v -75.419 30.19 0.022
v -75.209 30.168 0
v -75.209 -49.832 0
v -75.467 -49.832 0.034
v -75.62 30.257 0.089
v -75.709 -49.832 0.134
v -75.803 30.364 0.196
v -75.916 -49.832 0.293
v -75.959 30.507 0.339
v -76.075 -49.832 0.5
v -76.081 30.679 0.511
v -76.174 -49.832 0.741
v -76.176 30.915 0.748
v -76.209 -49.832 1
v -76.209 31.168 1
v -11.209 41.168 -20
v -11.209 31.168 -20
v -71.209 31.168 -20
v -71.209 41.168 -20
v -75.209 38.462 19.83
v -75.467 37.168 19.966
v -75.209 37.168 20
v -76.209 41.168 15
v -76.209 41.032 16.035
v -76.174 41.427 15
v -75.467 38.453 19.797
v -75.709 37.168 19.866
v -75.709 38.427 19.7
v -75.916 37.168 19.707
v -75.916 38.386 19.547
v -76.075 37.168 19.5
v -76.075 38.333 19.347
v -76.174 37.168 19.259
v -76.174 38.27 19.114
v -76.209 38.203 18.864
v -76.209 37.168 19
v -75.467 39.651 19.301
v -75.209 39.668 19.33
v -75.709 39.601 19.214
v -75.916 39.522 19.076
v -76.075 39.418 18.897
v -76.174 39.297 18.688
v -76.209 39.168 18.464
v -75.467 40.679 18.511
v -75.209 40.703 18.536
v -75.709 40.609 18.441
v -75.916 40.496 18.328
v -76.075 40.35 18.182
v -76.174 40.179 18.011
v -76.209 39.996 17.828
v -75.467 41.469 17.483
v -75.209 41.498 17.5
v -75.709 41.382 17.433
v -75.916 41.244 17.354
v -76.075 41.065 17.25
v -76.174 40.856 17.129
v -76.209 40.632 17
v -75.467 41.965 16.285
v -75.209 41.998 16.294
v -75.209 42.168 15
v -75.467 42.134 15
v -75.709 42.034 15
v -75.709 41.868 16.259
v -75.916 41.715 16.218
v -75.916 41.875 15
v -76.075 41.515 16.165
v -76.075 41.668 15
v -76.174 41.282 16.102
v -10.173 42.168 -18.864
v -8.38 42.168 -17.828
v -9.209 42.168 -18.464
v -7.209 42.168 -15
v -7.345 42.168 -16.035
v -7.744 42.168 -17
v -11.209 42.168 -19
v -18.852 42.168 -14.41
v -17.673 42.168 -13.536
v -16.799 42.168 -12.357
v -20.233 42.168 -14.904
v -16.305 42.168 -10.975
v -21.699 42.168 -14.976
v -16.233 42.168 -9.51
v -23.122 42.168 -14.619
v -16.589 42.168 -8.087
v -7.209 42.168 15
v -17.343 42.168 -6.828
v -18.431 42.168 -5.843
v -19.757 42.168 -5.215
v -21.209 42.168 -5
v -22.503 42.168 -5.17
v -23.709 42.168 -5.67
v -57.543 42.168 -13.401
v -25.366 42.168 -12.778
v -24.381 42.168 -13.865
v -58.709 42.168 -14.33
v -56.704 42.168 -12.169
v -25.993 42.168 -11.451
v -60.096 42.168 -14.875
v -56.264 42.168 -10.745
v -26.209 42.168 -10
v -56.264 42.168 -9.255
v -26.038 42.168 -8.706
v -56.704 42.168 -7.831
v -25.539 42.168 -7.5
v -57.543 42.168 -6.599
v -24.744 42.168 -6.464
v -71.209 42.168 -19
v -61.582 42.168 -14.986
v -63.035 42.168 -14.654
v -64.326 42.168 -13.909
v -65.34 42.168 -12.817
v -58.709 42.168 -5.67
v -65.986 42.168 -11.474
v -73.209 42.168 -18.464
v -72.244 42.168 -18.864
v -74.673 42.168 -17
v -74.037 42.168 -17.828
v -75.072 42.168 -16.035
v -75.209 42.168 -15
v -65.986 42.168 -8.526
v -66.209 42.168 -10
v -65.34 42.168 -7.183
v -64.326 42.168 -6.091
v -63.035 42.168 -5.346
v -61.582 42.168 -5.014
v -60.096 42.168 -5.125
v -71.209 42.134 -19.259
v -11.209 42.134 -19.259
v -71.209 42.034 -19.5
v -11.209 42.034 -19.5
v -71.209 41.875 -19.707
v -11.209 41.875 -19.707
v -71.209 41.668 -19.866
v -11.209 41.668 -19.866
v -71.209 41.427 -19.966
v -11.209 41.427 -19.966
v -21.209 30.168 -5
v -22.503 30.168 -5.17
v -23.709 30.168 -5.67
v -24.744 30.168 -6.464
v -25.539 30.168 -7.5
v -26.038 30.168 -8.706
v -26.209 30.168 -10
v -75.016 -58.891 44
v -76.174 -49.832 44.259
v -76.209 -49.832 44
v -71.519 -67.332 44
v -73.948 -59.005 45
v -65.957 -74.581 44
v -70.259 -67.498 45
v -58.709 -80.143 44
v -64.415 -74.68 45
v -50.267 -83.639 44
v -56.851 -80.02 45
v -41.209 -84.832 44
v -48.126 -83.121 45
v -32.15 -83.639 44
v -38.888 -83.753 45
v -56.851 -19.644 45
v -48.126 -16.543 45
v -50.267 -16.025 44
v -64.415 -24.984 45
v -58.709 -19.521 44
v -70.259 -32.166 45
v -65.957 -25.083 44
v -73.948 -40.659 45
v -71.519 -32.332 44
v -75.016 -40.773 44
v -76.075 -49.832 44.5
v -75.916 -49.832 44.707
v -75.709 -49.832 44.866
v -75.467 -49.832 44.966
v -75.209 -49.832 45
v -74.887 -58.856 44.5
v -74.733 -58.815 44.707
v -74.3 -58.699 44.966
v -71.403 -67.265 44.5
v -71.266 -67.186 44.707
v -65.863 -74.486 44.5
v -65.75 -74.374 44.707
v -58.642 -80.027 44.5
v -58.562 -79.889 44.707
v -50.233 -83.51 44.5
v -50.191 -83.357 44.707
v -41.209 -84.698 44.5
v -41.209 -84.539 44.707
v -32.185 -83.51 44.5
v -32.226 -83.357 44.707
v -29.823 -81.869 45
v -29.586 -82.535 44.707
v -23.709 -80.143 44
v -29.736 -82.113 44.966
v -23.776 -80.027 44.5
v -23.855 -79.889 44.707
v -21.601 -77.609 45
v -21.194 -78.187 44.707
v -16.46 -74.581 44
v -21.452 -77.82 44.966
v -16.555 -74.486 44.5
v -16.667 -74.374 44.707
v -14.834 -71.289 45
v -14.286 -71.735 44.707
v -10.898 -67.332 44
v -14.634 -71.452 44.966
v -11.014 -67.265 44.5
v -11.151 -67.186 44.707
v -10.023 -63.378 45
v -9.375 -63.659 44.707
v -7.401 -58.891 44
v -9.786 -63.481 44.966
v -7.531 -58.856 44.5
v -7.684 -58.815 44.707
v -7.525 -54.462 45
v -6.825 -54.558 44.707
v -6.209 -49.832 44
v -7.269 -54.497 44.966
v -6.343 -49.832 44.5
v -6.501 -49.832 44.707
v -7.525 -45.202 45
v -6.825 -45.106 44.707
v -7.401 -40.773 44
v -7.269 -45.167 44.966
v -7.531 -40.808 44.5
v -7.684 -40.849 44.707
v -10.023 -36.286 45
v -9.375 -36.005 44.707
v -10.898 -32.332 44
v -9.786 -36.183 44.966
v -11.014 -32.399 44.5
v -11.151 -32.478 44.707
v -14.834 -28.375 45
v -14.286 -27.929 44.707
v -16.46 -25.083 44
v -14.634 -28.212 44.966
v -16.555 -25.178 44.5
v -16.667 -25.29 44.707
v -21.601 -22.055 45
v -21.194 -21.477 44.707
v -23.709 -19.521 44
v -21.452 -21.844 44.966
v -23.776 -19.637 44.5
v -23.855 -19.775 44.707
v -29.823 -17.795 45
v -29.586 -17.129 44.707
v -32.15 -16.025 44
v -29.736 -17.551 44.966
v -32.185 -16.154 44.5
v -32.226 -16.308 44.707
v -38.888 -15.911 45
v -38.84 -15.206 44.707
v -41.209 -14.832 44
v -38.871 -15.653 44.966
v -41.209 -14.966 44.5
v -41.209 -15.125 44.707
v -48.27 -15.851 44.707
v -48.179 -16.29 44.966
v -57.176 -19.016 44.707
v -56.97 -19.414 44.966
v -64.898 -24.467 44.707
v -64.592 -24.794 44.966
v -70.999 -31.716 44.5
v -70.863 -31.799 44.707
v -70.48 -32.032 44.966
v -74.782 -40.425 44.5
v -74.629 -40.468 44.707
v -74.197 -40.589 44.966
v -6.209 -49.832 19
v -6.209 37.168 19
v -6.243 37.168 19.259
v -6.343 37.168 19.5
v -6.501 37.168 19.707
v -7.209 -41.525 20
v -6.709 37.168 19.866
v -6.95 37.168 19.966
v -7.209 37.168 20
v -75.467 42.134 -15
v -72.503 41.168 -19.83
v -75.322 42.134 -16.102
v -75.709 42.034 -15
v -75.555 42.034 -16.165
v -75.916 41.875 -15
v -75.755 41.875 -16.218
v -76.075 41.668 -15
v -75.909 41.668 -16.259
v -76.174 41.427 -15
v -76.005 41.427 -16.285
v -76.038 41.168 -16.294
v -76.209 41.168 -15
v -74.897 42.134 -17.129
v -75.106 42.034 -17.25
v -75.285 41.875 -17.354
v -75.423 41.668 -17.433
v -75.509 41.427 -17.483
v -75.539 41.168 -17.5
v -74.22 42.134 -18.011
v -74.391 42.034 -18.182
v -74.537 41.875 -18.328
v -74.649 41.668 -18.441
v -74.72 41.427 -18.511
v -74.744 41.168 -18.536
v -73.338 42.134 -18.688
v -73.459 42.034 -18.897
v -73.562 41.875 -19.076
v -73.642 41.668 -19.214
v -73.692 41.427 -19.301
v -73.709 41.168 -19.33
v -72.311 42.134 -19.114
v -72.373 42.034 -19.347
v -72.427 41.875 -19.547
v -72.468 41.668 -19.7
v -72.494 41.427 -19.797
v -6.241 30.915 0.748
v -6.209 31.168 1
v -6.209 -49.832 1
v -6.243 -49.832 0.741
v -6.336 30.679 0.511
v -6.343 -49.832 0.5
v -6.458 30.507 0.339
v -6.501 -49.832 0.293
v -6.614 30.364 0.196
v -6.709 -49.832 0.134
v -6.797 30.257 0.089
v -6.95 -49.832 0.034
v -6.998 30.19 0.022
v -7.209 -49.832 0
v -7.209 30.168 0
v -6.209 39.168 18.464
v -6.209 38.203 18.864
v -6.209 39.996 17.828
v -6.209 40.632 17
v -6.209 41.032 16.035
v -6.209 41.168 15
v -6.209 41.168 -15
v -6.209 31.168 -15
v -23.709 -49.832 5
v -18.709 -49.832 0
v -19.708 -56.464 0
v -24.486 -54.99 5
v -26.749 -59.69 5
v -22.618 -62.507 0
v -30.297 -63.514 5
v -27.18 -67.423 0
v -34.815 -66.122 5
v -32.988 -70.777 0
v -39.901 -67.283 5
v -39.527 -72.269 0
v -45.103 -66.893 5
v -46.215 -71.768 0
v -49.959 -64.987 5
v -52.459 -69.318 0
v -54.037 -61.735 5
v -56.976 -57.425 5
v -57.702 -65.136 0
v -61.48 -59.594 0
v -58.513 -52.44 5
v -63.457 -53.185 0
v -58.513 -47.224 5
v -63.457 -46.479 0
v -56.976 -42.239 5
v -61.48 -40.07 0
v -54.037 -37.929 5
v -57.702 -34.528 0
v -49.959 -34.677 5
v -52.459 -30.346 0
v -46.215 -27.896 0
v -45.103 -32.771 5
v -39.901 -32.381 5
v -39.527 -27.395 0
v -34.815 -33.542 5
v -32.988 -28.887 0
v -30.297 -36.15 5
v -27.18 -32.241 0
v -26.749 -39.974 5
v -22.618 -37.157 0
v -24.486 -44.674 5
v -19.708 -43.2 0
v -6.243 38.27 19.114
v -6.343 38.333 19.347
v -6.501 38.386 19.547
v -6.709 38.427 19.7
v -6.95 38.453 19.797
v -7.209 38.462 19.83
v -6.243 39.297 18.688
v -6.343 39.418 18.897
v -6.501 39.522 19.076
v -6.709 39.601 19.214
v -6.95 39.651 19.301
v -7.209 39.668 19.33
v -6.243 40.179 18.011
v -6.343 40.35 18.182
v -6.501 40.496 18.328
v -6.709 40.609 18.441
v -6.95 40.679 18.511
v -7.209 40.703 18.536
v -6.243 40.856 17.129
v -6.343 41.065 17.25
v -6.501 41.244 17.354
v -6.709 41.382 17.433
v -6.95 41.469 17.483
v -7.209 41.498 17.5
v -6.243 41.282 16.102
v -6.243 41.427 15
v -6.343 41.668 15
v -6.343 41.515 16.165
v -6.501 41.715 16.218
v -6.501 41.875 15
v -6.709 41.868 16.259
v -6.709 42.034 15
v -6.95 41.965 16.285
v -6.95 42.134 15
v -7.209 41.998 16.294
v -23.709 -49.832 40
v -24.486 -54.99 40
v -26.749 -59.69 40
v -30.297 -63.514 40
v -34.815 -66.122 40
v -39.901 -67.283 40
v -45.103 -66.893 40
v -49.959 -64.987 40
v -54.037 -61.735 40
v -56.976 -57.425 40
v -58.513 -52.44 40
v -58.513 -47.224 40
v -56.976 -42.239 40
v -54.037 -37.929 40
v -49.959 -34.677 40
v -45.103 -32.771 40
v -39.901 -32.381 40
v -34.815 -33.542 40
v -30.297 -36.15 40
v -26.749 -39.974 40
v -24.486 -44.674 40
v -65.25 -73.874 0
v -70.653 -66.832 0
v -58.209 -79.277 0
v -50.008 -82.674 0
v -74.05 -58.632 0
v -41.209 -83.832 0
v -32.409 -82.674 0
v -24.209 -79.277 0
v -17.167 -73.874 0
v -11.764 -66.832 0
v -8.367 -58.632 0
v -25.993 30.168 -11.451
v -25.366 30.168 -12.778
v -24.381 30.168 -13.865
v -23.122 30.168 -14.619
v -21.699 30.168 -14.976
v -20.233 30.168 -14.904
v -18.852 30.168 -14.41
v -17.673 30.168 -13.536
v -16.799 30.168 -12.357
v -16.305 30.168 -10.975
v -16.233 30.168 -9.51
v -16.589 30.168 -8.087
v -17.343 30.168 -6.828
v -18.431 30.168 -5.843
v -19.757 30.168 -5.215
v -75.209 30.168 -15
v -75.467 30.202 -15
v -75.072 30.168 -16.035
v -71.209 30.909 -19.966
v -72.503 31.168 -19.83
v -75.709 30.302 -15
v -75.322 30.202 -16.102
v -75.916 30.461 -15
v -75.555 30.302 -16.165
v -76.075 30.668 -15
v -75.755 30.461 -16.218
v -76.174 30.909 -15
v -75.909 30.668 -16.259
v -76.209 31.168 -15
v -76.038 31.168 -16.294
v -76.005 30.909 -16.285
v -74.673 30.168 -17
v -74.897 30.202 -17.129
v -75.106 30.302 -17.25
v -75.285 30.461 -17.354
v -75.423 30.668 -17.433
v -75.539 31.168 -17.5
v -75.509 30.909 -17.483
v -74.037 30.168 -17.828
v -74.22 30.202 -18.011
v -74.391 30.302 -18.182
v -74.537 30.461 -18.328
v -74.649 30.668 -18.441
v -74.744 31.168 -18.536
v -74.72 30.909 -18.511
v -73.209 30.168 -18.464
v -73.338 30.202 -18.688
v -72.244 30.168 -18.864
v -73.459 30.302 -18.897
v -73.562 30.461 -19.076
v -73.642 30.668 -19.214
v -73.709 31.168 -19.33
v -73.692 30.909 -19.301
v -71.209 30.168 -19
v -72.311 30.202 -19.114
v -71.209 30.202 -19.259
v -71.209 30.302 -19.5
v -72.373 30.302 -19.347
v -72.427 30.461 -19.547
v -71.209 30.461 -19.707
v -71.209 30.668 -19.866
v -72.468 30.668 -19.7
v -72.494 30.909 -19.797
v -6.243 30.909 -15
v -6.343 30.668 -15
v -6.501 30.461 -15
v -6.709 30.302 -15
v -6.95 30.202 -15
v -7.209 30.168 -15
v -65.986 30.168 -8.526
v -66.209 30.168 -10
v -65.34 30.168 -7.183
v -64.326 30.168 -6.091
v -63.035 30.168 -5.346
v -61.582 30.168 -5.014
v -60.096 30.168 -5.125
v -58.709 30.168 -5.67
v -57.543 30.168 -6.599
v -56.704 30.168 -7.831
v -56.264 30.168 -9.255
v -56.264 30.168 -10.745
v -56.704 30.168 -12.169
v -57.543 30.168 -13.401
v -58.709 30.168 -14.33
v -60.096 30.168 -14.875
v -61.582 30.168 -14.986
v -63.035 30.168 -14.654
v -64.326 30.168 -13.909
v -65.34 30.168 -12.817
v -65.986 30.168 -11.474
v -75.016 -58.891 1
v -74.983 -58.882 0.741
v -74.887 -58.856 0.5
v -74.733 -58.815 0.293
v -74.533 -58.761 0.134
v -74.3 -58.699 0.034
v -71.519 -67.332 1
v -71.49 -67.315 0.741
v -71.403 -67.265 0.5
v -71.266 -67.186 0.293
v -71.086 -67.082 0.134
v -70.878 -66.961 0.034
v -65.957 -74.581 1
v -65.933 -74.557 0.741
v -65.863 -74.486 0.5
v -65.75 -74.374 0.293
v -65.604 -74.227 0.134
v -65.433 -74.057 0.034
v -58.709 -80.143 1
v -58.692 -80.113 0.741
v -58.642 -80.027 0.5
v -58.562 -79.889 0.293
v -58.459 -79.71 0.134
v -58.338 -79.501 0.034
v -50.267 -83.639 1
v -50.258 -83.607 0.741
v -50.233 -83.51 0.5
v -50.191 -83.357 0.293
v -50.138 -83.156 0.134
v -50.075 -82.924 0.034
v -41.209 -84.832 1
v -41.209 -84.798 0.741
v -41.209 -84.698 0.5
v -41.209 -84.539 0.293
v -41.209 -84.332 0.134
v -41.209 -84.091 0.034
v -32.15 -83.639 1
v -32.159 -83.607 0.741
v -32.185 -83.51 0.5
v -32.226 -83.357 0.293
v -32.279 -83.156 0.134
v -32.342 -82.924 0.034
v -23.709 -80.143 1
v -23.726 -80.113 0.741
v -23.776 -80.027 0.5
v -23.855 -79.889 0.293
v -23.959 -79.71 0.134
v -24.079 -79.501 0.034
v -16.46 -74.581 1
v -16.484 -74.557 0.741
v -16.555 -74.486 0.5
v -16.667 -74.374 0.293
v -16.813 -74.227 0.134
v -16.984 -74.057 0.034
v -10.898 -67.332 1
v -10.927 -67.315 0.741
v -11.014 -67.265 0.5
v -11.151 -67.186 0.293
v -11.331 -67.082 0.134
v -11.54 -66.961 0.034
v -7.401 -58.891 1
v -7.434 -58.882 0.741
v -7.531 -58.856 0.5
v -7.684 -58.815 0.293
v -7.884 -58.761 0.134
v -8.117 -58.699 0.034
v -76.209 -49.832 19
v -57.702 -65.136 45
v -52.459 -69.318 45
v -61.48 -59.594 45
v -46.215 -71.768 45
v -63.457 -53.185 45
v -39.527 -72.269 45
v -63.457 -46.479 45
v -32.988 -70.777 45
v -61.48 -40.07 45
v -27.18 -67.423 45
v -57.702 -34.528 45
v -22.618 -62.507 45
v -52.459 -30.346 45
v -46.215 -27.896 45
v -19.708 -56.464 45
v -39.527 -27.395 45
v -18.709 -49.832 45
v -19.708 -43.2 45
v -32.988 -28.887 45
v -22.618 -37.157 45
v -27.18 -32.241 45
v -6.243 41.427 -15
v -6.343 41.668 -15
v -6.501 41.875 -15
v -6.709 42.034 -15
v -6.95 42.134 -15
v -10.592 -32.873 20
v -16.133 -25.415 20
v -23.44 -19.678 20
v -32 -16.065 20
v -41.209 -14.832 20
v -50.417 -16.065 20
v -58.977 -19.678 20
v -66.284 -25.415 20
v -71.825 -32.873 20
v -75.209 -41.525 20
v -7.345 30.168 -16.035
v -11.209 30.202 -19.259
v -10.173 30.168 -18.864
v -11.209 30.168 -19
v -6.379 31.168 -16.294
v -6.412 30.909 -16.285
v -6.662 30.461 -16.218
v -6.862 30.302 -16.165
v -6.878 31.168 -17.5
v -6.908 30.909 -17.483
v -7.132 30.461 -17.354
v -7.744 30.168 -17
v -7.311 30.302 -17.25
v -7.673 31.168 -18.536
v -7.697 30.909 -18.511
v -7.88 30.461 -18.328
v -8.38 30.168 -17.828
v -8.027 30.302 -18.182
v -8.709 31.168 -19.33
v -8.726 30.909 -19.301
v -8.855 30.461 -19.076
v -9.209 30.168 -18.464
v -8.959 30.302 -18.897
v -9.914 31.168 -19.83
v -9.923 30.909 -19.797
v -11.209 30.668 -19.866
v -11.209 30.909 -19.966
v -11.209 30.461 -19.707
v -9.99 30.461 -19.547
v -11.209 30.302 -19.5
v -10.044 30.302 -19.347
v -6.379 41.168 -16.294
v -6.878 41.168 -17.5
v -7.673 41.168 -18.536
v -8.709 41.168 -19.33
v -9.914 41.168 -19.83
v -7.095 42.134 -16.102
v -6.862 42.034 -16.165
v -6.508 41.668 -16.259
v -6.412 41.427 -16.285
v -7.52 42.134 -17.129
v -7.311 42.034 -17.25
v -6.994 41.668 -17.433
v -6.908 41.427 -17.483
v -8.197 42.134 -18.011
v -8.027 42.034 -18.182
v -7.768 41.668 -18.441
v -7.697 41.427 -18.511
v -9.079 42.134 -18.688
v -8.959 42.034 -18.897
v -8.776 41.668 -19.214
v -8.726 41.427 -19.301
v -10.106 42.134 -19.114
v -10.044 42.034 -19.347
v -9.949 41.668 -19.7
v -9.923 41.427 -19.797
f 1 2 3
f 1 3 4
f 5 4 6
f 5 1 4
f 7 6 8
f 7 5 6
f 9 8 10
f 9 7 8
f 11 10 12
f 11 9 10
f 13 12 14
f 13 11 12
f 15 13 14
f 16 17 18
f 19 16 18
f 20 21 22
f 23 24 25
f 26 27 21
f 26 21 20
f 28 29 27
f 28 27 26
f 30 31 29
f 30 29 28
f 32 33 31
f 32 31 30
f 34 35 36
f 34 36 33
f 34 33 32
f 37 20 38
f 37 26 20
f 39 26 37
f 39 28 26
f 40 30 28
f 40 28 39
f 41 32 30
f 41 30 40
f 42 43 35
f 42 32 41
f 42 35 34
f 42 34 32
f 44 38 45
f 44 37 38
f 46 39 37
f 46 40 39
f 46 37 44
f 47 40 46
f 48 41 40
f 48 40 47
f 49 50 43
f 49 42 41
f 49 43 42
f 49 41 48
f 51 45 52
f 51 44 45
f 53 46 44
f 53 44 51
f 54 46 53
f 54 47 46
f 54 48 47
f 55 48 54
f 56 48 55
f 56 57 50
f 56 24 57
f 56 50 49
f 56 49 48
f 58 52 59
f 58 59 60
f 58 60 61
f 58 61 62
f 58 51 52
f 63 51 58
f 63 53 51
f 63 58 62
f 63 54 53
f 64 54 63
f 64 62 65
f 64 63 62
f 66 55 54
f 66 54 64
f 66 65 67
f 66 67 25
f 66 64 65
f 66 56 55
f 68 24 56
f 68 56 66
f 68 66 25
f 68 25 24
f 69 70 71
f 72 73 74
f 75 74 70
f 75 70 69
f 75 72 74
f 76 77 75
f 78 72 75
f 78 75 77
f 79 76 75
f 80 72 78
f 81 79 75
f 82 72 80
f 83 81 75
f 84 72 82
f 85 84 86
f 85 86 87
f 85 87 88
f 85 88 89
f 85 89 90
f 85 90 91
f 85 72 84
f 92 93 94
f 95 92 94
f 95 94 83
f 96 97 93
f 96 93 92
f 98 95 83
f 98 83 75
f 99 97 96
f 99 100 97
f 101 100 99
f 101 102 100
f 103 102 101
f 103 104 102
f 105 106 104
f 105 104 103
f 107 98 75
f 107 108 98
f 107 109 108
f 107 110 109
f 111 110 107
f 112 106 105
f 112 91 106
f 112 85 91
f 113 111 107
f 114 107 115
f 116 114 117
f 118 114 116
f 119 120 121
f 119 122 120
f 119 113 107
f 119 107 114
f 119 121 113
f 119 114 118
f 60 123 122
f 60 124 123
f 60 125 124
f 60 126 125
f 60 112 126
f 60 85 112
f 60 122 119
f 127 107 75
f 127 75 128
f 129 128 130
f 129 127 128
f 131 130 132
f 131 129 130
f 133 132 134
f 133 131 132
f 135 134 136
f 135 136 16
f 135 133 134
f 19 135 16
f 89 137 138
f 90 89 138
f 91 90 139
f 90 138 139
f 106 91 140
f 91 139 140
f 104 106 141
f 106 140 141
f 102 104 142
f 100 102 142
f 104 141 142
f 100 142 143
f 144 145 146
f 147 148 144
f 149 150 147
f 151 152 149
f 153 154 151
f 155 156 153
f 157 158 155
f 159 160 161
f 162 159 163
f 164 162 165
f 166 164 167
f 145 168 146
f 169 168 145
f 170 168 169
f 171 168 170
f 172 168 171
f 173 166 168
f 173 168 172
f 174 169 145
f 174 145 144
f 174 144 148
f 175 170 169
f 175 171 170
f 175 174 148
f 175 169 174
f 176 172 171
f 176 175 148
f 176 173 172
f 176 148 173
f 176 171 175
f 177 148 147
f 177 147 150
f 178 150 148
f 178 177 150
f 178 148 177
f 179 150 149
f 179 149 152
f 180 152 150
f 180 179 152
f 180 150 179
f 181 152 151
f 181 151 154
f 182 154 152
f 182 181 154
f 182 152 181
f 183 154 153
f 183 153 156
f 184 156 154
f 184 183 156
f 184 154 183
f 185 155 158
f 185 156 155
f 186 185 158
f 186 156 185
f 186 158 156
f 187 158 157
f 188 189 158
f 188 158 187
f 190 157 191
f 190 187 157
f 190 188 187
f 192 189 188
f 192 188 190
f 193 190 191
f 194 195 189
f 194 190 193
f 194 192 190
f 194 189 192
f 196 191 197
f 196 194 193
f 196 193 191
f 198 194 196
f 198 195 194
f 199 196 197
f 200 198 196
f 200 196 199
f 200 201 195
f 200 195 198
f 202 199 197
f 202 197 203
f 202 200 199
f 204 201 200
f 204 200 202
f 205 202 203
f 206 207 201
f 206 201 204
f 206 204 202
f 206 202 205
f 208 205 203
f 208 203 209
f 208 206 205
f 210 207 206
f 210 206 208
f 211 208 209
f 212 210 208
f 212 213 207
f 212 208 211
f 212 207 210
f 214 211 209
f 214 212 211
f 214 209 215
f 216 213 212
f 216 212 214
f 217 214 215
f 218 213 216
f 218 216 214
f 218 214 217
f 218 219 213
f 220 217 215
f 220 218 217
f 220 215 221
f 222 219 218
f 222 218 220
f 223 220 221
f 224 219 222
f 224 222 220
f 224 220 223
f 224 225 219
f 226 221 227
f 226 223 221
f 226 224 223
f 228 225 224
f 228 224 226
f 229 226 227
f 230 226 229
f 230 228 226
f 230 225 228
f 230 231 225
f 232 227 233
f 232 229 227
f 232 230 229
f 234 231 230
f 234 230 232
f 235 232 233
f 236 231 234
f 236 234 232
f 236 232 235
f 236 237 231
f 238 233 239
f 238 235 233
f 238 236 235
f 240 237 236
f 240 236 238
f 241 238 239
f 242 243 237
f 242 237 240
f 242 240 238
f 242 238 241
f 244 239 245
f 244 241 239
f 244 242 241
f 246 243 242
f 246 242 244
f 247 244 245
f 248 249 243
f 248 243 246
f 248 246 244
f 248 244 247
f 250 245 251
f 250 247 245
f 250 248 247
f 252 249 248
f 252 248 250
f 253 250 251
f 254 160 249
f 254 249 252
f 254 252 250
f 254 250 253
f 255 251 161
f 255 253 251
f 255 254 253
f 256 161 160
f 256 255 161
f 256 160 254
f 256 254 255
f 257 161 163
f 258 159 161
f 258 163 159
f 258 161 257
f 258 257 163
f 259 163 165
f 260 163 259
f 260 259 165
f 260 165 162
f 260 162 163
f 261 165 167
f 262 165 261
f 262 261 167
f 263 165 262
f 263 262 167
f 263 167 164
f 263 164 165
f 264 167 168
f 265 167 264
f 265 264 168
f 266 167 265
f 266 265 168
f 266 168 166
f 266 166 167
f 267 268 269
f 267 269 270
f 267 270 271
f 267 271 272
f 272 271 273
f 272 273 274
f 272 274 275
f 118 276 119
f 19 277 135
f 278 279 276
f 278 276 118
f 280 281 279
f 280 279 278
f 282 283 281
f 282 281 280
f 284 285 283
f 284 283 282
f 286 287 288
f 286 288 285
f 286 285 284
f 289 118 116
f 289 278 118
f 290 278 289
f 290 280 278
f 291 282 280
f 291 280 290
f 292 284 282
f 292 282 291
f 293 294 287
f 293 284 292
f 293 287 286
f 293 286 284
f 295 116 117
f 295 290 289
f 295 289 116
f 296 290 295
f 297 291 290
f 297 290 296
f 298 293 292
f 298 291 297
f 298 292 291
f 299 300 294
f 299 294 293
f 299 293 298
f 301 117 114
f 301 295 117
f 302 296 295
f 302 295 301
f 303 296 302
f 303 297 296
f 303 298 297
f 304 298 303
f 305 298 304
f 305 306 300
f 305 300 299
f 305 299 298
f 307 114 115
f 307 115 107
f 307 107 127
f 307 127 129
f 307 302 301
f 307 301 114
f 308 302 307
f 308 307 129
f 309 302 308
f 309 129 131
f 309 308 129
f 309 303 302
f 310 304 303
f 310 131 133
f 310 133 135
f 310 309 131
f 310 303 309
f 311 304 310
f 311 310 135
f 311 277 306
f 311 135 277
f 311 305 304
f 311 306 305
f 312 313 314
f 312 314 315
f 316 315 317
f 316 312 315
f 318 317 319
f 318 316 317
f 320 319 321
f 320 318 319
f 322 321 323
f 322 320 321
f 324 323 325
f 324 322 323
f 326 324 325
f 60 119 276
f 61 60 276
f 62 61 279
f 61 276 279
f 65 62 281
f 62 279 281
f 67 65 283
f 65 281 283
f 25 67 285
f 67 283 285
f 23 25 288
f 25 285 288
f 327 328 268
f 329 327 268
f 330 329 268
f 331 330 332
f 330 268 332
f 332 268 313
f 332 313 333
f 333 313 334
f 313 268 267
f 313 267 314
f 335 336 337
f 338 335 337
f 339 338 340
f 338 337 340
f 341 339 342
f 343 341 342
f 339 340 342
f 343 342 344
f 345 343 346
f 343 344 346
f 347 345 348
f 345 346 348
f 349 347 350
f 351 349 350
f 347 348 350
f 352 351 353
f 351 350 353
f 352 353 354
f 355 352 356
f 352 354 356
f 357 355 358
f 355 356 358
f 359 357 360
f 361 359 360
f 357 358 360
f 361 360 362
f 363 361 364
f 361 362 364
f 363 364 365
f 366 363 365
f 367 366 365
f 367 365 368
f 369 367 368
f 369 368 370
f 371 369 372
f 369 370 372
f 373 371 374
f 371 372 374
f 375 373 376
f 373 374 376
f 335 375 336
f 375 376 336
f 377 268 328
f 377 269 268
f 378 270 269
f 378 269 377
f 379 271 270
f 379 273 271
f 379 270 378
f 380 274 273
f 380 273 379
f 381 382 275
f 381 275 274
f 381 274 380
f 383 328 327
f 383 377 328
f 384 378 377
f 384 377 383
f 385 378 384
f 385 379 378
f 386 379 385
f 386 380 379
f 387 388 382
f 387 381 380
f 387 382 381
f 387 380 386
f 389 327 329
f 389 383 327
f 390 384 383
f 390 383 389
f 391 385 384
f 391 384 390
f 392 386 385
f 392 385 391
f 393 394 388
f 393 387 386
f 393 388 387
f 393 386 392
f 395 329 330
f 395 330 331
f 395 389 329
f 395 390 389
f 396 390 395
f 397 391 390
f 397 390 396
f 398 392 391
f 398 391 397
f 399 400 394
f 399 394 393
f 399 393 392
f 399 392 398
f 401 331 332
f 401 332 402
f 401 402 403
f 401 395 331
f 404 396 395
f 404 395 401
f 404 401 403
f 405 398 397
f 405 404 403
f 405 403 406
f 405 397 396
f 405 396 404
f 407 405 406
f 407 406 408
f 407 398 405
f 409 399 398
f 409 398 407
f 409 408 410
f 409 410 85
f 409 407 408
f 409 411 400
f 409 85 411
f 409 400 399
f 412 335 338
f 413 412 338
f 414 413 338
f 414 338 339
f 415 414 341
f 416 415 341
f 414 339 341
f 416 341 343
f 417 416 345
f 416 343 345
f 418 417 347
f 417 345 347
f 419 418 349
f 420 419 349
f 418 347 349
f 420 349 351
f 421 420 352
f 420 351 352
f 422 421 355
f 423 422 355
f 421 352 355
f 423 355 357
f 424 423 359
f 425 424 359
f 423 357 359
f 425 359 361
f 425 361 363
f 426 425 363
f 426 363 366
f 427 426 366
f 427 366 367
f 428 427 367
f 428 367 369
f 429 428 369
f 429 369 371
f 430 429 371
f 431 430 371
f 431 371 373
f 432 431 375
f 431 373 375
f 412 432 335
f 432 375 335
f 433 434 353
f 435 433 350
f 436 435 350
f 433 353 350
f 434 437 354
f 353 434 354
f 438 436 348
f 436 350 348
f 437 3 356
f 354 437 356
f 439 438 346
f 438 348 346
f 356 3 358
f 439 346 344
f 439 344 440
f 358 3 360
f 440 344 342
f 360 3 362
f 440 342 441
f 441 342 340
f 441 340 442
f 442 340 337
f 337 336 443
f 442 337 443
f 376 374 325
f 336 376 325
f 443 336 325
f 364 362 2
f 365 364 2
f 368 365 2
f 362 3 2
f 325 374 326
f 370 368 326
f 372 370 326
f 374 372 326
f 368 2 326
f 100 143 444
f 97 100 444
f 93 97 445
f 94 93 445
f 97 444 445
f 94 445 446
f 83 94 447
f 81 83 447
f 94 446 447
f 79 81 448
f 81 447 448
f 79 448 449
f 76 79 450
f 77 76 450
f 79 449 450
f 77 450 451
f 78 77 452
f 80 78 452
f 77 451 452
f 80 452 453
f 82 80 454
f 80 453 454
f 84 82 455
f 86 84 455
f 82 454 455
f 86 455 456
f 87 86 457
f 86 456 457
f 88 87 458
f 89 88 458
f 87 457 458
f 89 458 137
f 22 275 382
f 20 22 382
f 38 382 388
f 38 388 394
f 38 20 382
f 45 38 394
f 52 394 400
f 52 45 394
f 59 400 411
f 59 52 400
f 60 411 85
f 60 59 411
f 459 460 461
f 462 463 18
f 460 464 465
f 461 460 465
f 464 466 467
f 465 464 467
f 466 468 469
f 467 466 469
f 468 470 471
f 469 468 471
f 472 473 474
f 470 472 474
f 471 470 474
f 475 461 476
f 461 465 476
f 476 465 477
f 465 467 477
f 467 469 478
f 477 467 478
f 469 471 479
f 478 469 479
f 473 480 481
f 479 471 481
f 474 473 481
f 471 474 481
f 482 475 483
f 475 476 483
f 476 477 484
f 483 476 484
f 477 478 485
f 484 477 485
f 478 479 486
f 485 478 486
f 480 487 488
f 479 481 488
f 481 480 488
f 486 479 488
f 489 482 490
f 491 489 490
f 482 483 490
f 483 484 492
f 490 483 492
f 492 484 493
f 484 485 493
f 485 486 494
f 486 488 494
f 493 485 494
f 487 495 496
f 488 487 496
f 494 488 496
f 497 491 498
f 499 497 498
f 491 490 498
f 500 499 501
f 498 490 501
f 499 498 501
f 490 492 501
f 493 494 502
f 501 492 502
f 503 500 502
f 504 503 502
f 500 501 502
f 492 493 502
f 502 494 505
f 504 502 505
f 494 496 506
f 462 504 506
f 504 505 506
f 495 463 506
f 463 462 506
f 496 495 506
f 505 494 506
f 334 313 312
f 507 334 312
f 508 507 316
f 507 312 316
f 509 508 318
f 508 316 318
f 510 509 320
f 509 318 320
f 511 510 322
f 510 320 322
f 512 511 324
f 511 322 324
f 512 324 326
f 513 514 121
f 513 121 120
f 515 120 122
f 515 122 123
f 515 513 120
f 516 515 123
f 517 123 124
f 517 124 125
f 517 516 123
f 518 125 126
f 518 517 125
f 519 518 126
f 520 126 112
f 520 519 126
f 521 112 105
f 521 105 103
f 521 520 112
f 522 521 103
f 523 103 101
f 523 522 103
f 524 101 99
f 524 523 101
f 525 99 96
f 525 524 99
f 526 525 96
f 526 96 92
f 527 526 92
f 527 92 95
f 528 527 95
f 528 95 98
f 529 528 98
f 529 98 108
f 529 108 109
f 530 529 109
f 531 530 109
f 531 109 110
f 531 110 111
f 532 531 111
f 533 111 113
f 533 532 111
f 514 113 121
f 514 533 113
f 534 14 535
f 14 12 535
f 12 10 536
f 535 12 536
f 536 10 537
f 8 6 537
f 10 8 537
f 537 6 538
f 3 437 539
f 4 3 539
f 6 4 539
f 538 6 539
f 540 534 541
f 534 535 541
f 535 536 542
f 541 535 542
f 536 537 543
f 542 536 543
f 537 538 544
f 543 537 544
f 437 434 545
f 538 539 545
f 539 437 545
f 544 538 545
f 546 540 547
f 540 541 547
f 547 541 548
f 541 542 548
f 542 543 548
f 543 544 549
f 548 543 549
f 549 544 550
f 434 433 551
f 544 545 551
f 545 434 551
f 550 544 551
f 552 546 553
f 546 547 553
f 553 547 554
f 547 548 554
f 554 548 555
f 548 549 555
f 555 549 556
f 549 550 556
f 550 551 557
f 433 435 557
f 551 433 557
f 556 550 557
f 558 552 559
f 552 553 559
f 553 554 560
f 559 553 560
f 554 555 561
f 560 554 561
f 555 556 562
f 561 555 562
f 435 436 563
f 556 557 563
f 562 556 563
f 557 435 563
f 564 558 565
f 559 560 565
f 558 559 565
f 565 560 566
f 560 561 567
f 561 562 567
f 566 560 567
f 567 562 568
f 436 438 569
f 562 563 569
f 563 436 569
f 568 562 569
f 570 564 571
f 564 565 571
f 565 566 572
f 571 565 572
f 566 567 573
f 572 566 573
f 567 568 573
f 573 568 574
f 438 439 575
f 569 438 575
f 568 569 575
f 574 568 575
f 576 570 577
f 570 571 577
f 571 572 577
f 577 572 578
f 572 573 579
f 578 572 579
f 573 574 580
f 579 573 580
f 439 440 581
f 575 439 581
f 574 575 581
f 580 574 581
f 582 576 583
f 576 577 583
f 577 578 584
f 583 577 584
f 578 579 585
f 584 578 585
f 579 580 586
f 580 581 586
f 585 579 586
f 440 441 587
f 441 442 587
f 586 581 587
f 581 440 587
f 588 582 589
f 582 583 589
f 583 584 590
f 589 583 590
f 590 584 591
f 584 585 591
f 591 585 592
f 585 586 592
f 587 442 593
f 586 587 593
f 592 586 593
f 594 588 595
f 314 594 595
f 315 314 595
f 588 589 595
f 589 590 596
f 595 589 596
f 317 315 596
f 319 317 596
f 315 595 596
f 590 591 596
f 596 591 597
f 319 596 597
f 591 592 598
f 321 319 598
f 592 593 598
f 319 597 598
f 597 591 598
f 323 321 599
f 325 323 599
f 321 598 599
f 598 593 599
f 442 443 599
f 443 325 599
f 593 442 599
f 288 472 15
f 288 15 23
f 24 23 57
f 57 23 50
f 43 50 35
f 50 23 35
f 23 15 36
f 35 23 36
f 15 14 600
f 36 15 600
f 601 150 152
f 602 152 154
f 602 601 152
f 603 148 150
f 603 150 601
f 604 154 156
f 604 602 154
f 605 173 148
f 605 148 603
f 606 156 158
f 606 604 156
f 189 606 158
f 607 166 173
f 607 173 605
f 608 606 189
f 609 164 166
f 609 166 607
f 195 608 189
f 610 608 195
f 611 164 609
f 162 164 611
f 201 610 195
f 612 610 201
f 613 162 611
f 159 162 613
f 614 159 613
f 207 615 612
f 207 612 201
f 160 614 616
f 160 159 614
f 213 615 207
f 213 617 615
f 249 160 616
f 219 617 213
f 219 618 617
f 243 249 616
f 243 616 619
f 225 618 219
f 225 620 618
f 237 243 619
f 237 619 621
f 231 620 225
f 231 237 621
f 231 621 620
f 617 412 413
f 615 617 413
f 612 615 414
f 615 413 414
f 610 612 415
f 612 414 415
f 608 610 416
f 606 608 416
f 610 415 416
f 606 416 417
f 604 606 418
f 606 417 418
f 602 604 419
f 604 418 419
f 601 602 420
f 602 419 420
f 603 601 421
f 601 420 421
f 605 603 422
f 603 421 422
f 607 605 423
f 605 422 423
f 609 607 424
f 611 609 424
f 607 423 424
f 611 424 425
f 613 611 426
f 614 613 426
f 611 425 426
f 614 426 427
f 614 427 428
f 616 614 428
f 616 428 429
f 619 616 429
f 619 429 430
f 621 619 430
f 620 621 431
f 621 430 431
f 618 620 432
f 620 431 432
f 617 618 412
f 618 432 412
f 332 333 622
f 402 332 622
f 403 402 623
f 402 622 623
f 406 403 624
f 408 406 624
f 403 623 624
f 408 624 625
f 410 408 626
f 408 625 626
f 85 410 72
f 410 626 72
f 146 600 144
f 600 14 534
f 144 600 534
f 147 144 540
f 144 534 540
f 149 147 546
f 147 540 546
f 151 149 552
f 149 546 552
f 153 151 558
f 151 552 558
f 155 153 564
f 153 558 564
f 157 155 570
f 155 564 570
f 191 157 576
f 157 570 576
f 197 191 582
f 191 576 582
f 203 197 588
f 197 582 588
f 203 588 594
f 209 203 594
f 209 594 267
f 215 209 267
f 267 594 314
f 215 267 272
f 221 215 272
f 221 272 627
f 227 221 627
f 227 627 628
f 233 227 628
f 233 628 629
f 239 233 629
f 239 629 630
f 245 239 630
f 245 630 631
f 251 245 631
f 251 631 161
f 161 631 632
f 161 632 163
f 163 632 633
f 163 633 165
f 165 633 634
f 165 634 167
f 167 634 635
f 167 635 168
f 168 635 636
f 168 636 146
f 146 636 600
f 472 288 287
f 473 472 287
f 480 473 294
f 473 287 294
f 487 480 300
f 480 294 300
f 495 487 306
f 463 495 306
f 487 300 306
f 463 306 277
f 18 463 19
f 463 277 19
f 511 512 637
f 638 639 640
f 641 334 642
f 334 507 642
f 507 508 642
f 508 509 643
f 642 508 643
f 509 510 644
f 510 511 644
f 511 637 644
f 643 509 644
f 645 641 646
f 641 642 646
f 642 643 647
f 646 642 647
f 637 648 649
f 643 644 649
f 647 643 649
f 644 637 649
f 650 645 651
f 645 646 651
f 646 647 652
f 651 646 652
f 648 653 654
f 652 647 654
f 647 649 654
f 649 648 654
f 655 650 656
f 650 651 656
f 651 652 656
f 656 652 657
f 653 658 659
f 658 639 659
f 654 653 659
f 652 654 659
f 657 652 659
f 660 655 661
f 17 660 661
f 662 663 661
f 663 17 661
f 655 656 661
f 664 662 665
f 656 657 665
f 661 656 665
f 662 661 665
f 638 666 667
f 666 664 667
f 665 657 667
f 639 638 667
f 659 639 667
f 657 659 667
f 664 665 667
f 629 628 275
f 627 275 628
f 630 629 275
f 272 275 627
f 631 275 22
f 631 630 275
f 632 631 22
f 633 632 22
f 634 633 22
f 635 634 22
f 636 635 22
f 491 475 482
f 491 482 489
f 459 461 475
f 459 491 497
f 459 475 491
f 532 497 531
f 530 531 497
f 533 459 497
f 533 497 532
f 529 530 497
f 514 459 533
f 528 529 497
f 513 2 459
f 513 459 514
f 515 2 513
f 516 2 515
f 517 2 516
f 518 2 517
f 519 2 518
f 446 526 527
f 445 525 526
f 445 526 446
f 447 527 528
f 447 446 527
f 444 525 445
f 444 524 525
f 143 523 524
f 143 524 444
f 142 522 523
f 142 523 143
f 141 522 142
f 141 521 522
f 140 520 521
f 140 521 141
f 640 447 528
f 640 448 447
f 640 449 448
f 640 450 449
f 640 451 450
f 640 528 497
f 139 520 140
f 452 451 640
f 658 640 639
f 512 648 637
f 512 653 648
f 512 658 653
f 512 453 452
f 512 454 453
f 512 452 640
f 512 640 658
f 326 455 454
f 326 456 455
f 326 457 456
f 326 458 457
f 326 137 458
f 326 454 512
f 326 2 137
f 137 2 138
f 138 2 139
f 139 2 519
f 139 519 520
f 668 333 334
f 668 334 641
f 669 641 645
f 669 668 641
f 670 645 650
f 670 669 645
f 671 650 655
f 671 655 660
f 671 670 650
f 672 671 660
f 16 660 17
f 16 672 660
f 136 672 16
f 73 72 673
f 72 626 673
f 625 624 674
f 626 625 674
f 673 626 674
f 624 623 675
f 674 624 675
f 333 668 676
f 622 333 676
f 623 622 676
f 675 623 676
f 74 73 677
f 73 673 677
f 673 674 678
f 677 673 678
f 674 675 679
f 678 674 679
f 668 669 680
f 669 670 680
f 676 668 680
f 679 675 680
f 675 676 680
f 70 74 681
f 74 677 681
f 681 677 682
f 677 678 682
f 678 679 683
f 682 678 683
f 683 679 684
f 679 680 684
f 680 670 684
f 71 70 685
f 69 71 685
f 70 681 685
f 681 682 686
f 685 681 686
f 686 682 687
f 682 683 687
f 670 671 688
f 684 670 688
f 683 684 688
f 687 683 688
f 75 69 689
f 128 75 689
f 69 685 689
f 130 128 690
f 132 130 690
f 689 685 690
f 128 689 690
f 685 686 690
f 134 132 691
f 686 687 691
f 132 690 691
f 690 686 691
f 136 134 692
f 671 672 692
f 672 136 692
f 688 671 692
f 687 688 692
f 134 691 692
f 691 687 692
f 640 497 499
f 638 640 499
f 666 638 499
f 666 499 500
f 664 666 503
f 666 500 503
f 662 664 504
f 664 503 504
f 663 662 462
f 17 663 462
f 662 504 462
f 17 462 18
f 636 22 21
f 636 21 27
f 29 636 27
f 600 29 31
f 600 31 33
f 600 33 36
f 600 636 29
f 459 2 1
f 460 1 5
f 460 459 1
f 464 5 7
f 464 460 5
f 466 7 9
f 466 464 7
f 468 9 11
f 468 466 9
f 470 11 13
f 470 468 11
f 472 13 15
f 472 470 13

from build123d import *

# Parameters (mm, degrees)
F1_DEPTH     = 45
F2_DEPTH     = 20
F3_W         = 70
F3_H         = 20
F3_R         = 5
F4_DEPTH     = 12
F5_SIZE      = 5
F6_SIZE      = 5
F7_R         = 5
F8_T1_DEPTH  = 80
F8_T3_DEPTH  = 60
F8_T5_DEPTH  = 30
F8_T7_DEPTH  = 15
F8_T12_DEPTH = 99.5
F8_S13_R     = 35
F8_T14_DEPTH = 51
F8_T16_ANGLE = 180
F8_T20_DEPTH = 99.5
F8_S21_R     = 35
F8_T22_DEPTH = 51
F8_T24_ANGLE = 90
F8_T26_ANGLE = 90
F8_T28_ANGLE = 90
F8_T30_ANGLE = 90
F8_T32_ANGLE = 90
F8_T34_ANGLE = 90
F8_T39_DEPTH = 82.5
F8_T43_DEPTH = 17.5
F8_T50_DEPTH = 82.5
F8_T54_DEPTH = 17.5
F9_R         = 1


# Not quite as in the source:
# - a fillet or chamfer that OpenCascade refuses, or shapes differently, is made with other operations: its cross-section is extruded or revolved along the edge and cut away or added


with BuildPart() as f1:
    # F0 (on Top) → F1 (new body)
    with BuildSketch(Plane.XY):
        with BuildLine():
            Line((-23.7085466087, -49.8320348561), (-6.2085466087, -49.8320348561))
            ThreePointArc((-6.2085466087, -49.8320348561), (-41.2085466087, -14.8320348561), (-76.2085466087, -49.8320348561))
            Line((-76.2085466087, -49.8320348561), (-58.7085466087, -49.8320348561))
            ThreePointArc((-58.7085466087, -49.8320348561), (-41.2085466087, -32.3320348561), (-23.7085466087, -49.8320348561))
        make_face()
        with BuildLine():
            ThreePointArc((-76.2085466087, -49.8320348561), (-41.2085466087, -84.8320348561), (-6.2085466087, -49.8320348561))
            Line((-6.2085466087, -49.8320348561), (-23.7085466087, -49.8320348561))
            ThreePointArc((-23.7085466087, -49.8320348561), (-41.2085466087, -67.3320348561), (-58.7085466087, -49.8320348561))
            Line((-58.7085466087, -49.8320348561), (-76.2085466087, -49.8320348561))
        make_face()
    extrude(amount=F1_DEPTH)

    # F0 (on Top) → F2 (join)
    with BuildSketch(Plane.XY):
        with BuildLine():
            Line((-23.7085466087, -49.8320348561), (-6.2085466087, -49.8320348561))
            ThreePointArc((-6.2085466087, -49.8320348561), (-41.2085466087, -14.8320348561), (-76.2085466087, -49.8320348561))
            Line((-76.2085466087, -49.8320348561), (-58.7085466087, -49.8320348561))
            ThreePointArc((-58.7085466087, -49.8320348561), (-41.2085466087, -32.3320348561), (-23.7085466087, -49.8320348561))
        make_face()
        with BuildLine():
            ThreePointArc((-76.2085466087, -49.8320348561), (-41.2085466087, -84.8320348561), (-6.2085466087, -49.8320348561))
            Line((-6.2085466087, -49.8320348561), (-23.7085466087, -49.8320348561))
            ThreePointArc((-23.7085466087, -49.8320348561), (-41.2085466087, -67.3320348561), (-58.7085466087, -49.8320348561))
            Line((-58.7085466087, -49.8320348561), (-76.2085466087, -49.8320348561))
        make_face()
        with BuildLine():
            ThreePointArc((-76.2085466087, -49.8320348561), (-41.2085466087, -14.8320348561), (-6.2085466087, -49.8320348561))
            Line((-6.2085466087, -49.8320348561), (-6.2085466087, 30.1679651439))
            Line((-6.2085466087, 30.1679651439), (-76.2085466087, 30.1679651439))
            Line((-76.2085466087, 30.1679651439), (-76.2085466087, -49.8320348561))
        make_face()
    extrude(amount=F2_DEPTH)

    # F3 (on face) → F4 (join)
    with BuildSketch(Plane(origin=(0, 30.1679651439, 0), x_dir=(-1, 0, 0), z_dir=(0, 1, 0))):
        with Locations((41.2085466087, -10)):
            Rectangle(F3_W, F3_H)
        with BuildLine():
            ThreePointArc((21.2085466087, -5), (24.7440805146, -6.4644660941), (26.2085466087, -10))
            ThreePointArc((26.2085466087, -10), (17.6730127028, -13.5355339059), (21.2085466087, -5))
        make_face(mode=Mode.SUBTRACT)
        with Locations((61.2085466087, -10)):
            Circle(F3_R, mode=Mode.SUBTRACT)
        with Locations((41.2085466087, 10)):
            Rectangle(F3_W, F3_H)
    extrude(amount=F4_DEPTH)

    # F5
    f5_edges = [f1.edges().sort_by_distance(p)[0] for p in [
        (-58.708547, -49.832035, 45),
    ]]
    chamfer(f5_edges, length=F5_SIZE)

    # F6
    f6_edges = [f1.edges().sort_by_distance(p)[0] for p in [
        (-58.708547, -49.832035, 0),
    ]]
    chamfer(f6_edges, length=F6_SIZE)

    # F7
    f7_edges = [f1.edges().sort_by_distance(p)[0] for p in [
        (-76.208547, 36.167965, -20),
        (-6.208547, 36.167965, -20),
        (-41.208547, 42.167965, 20),
    ]]
    fillet(f7_edges, radius=F7_R)

    # F8: fillet of radius 1 on 9 edges, made by hand

    # F8_s2 → F8_t1 (cut)
    with BuildSketch(Plane.XZ.offset(-30.1679651439)):
        with BuildLine():
            ThreePointArc((-75.2085466087, 0), (-75.9156533899, 0.2928932188), (-76.2085466087, 1))
            Line((-76.2085466087, 1), (-76.2085466087, 0))
            Line((-76.2085466087, 0), (-75.2085466087, 0))
        make_face()
        with BuildLine():
            ThreePointArc((-6.2085466087, 1), (-6.5014398275, 0.2928932188), (-7.2085466087, 0))
            Line((-7.2085466087, 0), (-6.2085466087, 0))
            Line((-6.2085466087, 0), (-6.2085466087, 1))
        make_face()
    extrude(amount=F8_T1_DEPTH, mode=Mode.SUBTRACT)

    # F8_s4 → F8_t3 (cut)
    with BuildSketch(Plane.YZ.offset(-71.2085466087)):
        with BuildLine():
            ThreePointArc((30.1679651439, -19), (30.4608583627, -19.7071067812), (31.1679651439, -20))
            Line((31.1679651439, -20), (30.1679651439, -20))
            Line((30.1679651439, -20), (30.1679651439, -19))
        make_face()
        with BuildLine():
            ThreePointArc((42.1679651439, -19), (41.8750719251, -19.7071067812), (41.1679651439, -20))
            Line((41.1679651439, -20), (42.1679651439, -20))
            Line((42.1679651439, -20), (42.1679651439, -19))
        make_face()
    extrude(amount=F8_T3_DEPTH, mode=Mode.SUBTRACT)

    # F8_s6 → F8_t5 (cut)
    with BuildSketch(Plane.XY.offset(-15)):
        with BuildLine():
            ThreePointArc((-6.2085466087, 41.1679651439), (-6.5014398275, 41.8750719251), (-7.2085466087, 42.1679651439))
            Line((-7.2085466087, 42.1679651439), (-6.2085466087, 42.1679651439))
            Line((-6.2085466087, 42.1679651439), (-6.2085466087, 41.1679651439))
        make_face()
        with BuildLine():
            ThreePointArc((-75.2085466087, 42.1679651439), (-75.9156533899, 41.8750719251), (-76.2085466087, 41.1679651439))
            Line((-76.2085466087, 41.1679651439), (-76.2085466087, 42.1679651439))
            Line((-76.2085466087, 42.1679651439), (-75.2085466087, 42.1679651439))
        make_face()
    extrude(amount=F8_T5_DEPTH, mode=Mode.SUBTRACT)

    # F8_s8 → F8_t7 (cut)
    with BuildSketch(Plane.XY.offset(-15)):
        with BuildLine():
            ThreePointArc((-75.2085466087, 30.1679651439), (-75.9156533899, 30.4608583627), (-76.2085466087, 31.1679651439))
            Line((-76.2085466087, 31.1679651439), (-76.2085466087, 30.1679651439))
            Line((-76.2085466087, 30.1679651439), (-75.2085466087, 30.1679651439))
        make_face()
        with BuildLine():
            ThreePointArc((-6.2085466087, 31.1679651439), (-6.5014398275, 30.4608583627), (-7.2085466087, 30.1679651439))
            Line((-7.2085466087, 30.1679651439), (-6.2085466087, 30.1679651439))
            Line((-6.2085466087, 30.1679651439), (-6.2085466087, 31.1679651439))
        make_face()
    extrude(amount=F8_T7_DEPTH, mode=Mode.SUBTRACT)


with BuildPart() as f8_tool10:
    # F8_s11 → F8_t12 (new body)
    with BuildSketch(Plane.XZ.offset(62.3320348561)):
        with BuildLine():
            ThreePointArc((-75.2085466087, 20), (-75.9156533899, 19.7071067812), (-76.2085466087, 19))
            Line((-76.2085466087, 19), (-76.2085466087, 20))
            Line((-76.2085466087, 20), (-75.2085466087, 20))
        make_face()
    extrude(amount=-F8_T12_DEPTH)

    # F8_s13 → F8_t14 (cut, symmetric)
    with BuildSketch(Plane.XY.offset(19.5)):
        with Locations((-41.2085466087, -49.8320348561)):
            Circle(F8_S13_R)
    extrude(amount=F8_T14_DEPTH, both=True, mode=Mode.SUBTRACT)


with BuildPart() as f1_1:
    add(f1.part)

    # F8_t9: cut F8_tool10
    add(f8_tool10.part, mode=Mode.SUBTRACT)

    # F8_s15 → F8_t16 (revolve, cut)
    with BuildSketch(Plane.XZ.offset(49.8320348561)):
        with BuildLine():
            ThreePointArc((-76.2085466087, 1), (-75.9156533899, 0.2928932188), (-75.2085466087, 0))
            Line((-75.2085466087, 0), (-76.2085466087, 0))
            Line((-76.2085466087, 0), (-76.2085466087, 1))
        make_face()
    revolve(axis=Axis((-41.2085466087, -49.8320348561, 0), (0, 0, 1)), revolution_arc=F8_T16_ANGLE, mode=Mode.SUBTRACT)


with BuildPart() as f8_tool18:
    # F8_s19 → F8_t20 (new body)
    with BuildSketch(Plane.XZ.offset(-37.1679651439)):
        with BuildLine():
            ThreePointArc((-6.2085466087, 19), (-6.5014398275, 19.7071067812), (-7.2085466087, 20))
            Line((-7.2085466087, 20), (-6.2085466087, 20))
            Line((-6.2085466087, 20), (-6.2085466087, 19))
        make_face()
    extrude(amount=F8_T20_DEPTH)

    # F8_s21 → F8_t22 (cut, symmetric)
    with BuildSketch(Plane.XY.offset(19.5)):
        with Locations((-41.2085466087, -49.8320348561)):
            Circle(F8_S21_R)
    extrude(amount=F8_T22_DEPTH, both=True, mode=Mode.SUBTRACT)


with BuildPart() as f1_2:
    add(f1_1.part)

    # F8_t17: cut F8_tool18
    add(f8_tool18.part, mode=Mode.SUBTRACT)

    # F8_s23 → F8_t24 (revolve, cut)
    with BuildSketch(Plane.XY.offset(-15)):
        with BuildLine():
            ThreePointArc((-75.2085466087, 42.1679651439), (-75.9156533899, 41.8750719251), (-76.2085466087, 41.1679651439))
            Line((-76.2085466087, 41.1679651439), (-76.2085466087, 42.1679651439))
            Line((-76.2085466087, 42.1679651439), (-75.2085466087, 42.1679651439))
        make_face()
    revolve(axis=Axis((-71.2085466087, 42.1679651439, -15), (0, -1, 0)), revolution_arc=F8_T24_ANGLE, mode=Mode.SUBTRACT)

    # F8_s25 → F8_t26 (revolve, cut)
    with BuildSketch(Plane.XZ.offset(-37.1679651439)):
        with BuildLine():
            ThreePointArc((-75.2085466087, 20), (-75.9156533899, 19.7071067812), (-76.2085466087, 19))
            Line((-76.2085466087, 19), (-76.2085466087, 20))
            Line((-76.2085466087, 20), (-75.2085466087, 20))
        make_face()
    revolve(axis=Axis((-76.2085466087, 37.1679651439, 15), (-1, 0, 0)), revolution_arc=F8_T26_ANGLE, mode=Mode.SUBTRACT)

    # F8_s27 → F8_t28 (revolve, cut)
    with BuildSketch(Plane.XZ.offset(-37.1679651439)):
        with BuildLine():
            ThreePointArc((-6.2085466087, 19), (-6.5014398275, 19.7071067812), (-7.2085466087, 20))
            Line((-7.2085466087, 20), (-6.2085466087, 20))
            Line((-6.2085466087, 20), (-6.2085466087, 19))
        make_face()
    revolve(axis=Axis((-6.2085466087, 37.1679651439, 15), (-1, 0, 0)), revolution_arc=F8_T28_ANGLE, mode=Mode.SUBTRACT)

    # F8_s29 → F8_t30 (revolve, cut)
    with BuildSketch(Plane.XY.offset(-15)):
        with BuildLine():
            ThreePointArc((-7.2085466087, 42.1679651439), (-6.5014398275, 41.8750719251), (-6.2085466087, 41.1679651439))
            Line((-6.2085466087, 41.1679651439), (-6.2085466087, 42.1679651439))
            Line((-6.2085466087, 42.1679651439), (-7.2085466087, 42.1679651439))
        make_face()
    revolve(axis=Axis((-11.2085466087, 42.1679651439, -15), (0, 1, 0)), revolution_arc=F8_T30_ANGLE, mode=Mode.SUBTRACT)

    # F8_s31 → F8_t32 (revolve, cut)
    with BuildSketch(Plane.XY.offset(-15)):
        with BuildLine():
            ThreePointArc((-6.2085466087, 31.1679651439), (-6.5014398275, 30.4608583627), (-7.2085466087, 30.1679651439))
            Line((-7.2085466087, 30.1679651439), (-6.2085466087, 30.1679651439))
            Line((-6.2085466087, 30.1679651439), (-6.2085466087, 31.1679651439))
        make_face()
    revolve(axis=Axis((-11.2085466087, 30.1679651439, -15), (0, 1, 0)), revolution_arc=F8_T32_ANGLE, mode=Mode.SUBTRACT)

    # F8_s33 → F8_t34 (revolve, cut)
    with BuildSketch(Plane.XY.offset(-15)):
        with BuildLine():
            ThreePointArc((-75.2085466087, 30.1679651439), (-75.9156533899, 30.4608583627), (-76.2085466087, 31.1679651439))
            Line((-76.2085466087, 31.1679651439), (-76.2085466087, 30.1679651439))
            Line((-76.2085466087, 30.1679651439), (-75.2085466087, 30.1679651439))
        make_face()
    revolve(axis=Axis((-71.2085466087, 30.1679651439, -15), (0, -1, 0)), revolution_arc=F8_T34_ANGLE, mode=Mode.SUBTRACT)


with BuildPart() as f8_tool37:
    # F8_s38 → F8_t39 (new body)
    with BuildSketch(Plane.XZ.offset(-32.6679651439)):
        with BuildLine():
            ThreePointArc((-75.2085466087, 0), (-75.9156533899, 0.2928932188), (-76.2085466087, 1))
            Line((-76.2085466087, 1), (-76.2085466087, 0))
            Line((-76.2085466087, 0), (-75.2085466087, 0))
        make_face()
    extrude(amount=F8_T39_DEPTH)

    split(bisect_by=Plane.XZ.offset(-30.1679651439), keep=Keep.BOTTOM)


with BuildPart() as f8_tool41:
    # F8_s42 → F8_t43 (new body)
    with BuildSketch(Plane.XY.offset(-15)):
        with BuildLine():
            ThreePointArc((-75.2085466087, 30.1679651439), (-75.9156533899, 30.4608583627), (-76.2085466087, 31.1679651439))
            Line((-76.2085466087, 31.1679651439), (-76.2085466087, 30.1679651439))
            Line((-76.2085466087, 30.1679651439), (-75.2085466087, 30.1679651439))
        make_face()
    extrude(amount=F8_T43_DEPTH)

    split(bisect_by=Plane.XY, keep=Keep.TOP)


with BuildPart() as f8_tool37_1:
    add(f8_tool37.part)

    # F8_t45: intersect F8_tool41
    add(f8_tool41.part, mode=Mode.INTERSECT)


with BuildPart() as f1_3:
    add(f1_2.part)

    # F8_t35: cut F8_tool37
    add(f8_tool37_1.part, mode=Mode.SUBTRACT)


with BuildPart() as f8_tool48:
    # F8_s49 → F8_t50 (new body)
    with BuildSketch(Plane.XZ.offset(49.8320348561)):
        with BuildLine():
            ThreePointArc((-6.2085466087, 1), (-6.5014398275, 0.2928932188), (-7.2085466087, 0))
            Line((-7.2085466087, 0), (-6.2085466087, 0))
            Line((-6.2085466087, 0), (-6.2085466087, 1))
        make_face()
    extrude(amount=-F8_T50_DEPTH)

    split(bisect_by=Plane.XZ.offset(-30.1679651439), keep=Keep.BOTTOM)


with BuildPart() as f8_tool52:
    # F8_s53 → F8_t54 (new body)
    with BuildSketch(Plane.XY.offset(2.5)):
        with BuildLine():
            ThreePointArc((-6.2085466087, 31.1679651439), (-6.5014398275, 30.4608583627), (-7.2085466087, 30.1679651439))
            Line((-7.2085466087, 30.1679651439), (-6.2085466087, 30.1679651439))
            Line((-6.2085466087, 30.1679651439), (-6.2085466087, 31.1679651439))
        make_face()
    extrude(amount=-F8_T54_DEPTH)

    split(bisect_by=Plane.XY, keep=Keep.TOP)


with BuildPart() as f8_tool48_1:
    add(f8_tool48.part)

    # F8_t56: intersect F8_tool52
    add(f8_tool52.part, mode=Mode.INTERSECT)


with BuildPart() as f1_4:
    add(f1_3.part)

    # F8_t46: cut F8_tool48
    add(f8_tool48_1.part, mode=Mode.SUBTRACT)

    # F9
    f9_edges = [f1_4.edges().sort_by_distance(p)[0] for p in [
        (-6.208547, -49.832035, 45),
    ]]
    fillet(f9_edges, radius=F9_R)


solid = f1_4.part
